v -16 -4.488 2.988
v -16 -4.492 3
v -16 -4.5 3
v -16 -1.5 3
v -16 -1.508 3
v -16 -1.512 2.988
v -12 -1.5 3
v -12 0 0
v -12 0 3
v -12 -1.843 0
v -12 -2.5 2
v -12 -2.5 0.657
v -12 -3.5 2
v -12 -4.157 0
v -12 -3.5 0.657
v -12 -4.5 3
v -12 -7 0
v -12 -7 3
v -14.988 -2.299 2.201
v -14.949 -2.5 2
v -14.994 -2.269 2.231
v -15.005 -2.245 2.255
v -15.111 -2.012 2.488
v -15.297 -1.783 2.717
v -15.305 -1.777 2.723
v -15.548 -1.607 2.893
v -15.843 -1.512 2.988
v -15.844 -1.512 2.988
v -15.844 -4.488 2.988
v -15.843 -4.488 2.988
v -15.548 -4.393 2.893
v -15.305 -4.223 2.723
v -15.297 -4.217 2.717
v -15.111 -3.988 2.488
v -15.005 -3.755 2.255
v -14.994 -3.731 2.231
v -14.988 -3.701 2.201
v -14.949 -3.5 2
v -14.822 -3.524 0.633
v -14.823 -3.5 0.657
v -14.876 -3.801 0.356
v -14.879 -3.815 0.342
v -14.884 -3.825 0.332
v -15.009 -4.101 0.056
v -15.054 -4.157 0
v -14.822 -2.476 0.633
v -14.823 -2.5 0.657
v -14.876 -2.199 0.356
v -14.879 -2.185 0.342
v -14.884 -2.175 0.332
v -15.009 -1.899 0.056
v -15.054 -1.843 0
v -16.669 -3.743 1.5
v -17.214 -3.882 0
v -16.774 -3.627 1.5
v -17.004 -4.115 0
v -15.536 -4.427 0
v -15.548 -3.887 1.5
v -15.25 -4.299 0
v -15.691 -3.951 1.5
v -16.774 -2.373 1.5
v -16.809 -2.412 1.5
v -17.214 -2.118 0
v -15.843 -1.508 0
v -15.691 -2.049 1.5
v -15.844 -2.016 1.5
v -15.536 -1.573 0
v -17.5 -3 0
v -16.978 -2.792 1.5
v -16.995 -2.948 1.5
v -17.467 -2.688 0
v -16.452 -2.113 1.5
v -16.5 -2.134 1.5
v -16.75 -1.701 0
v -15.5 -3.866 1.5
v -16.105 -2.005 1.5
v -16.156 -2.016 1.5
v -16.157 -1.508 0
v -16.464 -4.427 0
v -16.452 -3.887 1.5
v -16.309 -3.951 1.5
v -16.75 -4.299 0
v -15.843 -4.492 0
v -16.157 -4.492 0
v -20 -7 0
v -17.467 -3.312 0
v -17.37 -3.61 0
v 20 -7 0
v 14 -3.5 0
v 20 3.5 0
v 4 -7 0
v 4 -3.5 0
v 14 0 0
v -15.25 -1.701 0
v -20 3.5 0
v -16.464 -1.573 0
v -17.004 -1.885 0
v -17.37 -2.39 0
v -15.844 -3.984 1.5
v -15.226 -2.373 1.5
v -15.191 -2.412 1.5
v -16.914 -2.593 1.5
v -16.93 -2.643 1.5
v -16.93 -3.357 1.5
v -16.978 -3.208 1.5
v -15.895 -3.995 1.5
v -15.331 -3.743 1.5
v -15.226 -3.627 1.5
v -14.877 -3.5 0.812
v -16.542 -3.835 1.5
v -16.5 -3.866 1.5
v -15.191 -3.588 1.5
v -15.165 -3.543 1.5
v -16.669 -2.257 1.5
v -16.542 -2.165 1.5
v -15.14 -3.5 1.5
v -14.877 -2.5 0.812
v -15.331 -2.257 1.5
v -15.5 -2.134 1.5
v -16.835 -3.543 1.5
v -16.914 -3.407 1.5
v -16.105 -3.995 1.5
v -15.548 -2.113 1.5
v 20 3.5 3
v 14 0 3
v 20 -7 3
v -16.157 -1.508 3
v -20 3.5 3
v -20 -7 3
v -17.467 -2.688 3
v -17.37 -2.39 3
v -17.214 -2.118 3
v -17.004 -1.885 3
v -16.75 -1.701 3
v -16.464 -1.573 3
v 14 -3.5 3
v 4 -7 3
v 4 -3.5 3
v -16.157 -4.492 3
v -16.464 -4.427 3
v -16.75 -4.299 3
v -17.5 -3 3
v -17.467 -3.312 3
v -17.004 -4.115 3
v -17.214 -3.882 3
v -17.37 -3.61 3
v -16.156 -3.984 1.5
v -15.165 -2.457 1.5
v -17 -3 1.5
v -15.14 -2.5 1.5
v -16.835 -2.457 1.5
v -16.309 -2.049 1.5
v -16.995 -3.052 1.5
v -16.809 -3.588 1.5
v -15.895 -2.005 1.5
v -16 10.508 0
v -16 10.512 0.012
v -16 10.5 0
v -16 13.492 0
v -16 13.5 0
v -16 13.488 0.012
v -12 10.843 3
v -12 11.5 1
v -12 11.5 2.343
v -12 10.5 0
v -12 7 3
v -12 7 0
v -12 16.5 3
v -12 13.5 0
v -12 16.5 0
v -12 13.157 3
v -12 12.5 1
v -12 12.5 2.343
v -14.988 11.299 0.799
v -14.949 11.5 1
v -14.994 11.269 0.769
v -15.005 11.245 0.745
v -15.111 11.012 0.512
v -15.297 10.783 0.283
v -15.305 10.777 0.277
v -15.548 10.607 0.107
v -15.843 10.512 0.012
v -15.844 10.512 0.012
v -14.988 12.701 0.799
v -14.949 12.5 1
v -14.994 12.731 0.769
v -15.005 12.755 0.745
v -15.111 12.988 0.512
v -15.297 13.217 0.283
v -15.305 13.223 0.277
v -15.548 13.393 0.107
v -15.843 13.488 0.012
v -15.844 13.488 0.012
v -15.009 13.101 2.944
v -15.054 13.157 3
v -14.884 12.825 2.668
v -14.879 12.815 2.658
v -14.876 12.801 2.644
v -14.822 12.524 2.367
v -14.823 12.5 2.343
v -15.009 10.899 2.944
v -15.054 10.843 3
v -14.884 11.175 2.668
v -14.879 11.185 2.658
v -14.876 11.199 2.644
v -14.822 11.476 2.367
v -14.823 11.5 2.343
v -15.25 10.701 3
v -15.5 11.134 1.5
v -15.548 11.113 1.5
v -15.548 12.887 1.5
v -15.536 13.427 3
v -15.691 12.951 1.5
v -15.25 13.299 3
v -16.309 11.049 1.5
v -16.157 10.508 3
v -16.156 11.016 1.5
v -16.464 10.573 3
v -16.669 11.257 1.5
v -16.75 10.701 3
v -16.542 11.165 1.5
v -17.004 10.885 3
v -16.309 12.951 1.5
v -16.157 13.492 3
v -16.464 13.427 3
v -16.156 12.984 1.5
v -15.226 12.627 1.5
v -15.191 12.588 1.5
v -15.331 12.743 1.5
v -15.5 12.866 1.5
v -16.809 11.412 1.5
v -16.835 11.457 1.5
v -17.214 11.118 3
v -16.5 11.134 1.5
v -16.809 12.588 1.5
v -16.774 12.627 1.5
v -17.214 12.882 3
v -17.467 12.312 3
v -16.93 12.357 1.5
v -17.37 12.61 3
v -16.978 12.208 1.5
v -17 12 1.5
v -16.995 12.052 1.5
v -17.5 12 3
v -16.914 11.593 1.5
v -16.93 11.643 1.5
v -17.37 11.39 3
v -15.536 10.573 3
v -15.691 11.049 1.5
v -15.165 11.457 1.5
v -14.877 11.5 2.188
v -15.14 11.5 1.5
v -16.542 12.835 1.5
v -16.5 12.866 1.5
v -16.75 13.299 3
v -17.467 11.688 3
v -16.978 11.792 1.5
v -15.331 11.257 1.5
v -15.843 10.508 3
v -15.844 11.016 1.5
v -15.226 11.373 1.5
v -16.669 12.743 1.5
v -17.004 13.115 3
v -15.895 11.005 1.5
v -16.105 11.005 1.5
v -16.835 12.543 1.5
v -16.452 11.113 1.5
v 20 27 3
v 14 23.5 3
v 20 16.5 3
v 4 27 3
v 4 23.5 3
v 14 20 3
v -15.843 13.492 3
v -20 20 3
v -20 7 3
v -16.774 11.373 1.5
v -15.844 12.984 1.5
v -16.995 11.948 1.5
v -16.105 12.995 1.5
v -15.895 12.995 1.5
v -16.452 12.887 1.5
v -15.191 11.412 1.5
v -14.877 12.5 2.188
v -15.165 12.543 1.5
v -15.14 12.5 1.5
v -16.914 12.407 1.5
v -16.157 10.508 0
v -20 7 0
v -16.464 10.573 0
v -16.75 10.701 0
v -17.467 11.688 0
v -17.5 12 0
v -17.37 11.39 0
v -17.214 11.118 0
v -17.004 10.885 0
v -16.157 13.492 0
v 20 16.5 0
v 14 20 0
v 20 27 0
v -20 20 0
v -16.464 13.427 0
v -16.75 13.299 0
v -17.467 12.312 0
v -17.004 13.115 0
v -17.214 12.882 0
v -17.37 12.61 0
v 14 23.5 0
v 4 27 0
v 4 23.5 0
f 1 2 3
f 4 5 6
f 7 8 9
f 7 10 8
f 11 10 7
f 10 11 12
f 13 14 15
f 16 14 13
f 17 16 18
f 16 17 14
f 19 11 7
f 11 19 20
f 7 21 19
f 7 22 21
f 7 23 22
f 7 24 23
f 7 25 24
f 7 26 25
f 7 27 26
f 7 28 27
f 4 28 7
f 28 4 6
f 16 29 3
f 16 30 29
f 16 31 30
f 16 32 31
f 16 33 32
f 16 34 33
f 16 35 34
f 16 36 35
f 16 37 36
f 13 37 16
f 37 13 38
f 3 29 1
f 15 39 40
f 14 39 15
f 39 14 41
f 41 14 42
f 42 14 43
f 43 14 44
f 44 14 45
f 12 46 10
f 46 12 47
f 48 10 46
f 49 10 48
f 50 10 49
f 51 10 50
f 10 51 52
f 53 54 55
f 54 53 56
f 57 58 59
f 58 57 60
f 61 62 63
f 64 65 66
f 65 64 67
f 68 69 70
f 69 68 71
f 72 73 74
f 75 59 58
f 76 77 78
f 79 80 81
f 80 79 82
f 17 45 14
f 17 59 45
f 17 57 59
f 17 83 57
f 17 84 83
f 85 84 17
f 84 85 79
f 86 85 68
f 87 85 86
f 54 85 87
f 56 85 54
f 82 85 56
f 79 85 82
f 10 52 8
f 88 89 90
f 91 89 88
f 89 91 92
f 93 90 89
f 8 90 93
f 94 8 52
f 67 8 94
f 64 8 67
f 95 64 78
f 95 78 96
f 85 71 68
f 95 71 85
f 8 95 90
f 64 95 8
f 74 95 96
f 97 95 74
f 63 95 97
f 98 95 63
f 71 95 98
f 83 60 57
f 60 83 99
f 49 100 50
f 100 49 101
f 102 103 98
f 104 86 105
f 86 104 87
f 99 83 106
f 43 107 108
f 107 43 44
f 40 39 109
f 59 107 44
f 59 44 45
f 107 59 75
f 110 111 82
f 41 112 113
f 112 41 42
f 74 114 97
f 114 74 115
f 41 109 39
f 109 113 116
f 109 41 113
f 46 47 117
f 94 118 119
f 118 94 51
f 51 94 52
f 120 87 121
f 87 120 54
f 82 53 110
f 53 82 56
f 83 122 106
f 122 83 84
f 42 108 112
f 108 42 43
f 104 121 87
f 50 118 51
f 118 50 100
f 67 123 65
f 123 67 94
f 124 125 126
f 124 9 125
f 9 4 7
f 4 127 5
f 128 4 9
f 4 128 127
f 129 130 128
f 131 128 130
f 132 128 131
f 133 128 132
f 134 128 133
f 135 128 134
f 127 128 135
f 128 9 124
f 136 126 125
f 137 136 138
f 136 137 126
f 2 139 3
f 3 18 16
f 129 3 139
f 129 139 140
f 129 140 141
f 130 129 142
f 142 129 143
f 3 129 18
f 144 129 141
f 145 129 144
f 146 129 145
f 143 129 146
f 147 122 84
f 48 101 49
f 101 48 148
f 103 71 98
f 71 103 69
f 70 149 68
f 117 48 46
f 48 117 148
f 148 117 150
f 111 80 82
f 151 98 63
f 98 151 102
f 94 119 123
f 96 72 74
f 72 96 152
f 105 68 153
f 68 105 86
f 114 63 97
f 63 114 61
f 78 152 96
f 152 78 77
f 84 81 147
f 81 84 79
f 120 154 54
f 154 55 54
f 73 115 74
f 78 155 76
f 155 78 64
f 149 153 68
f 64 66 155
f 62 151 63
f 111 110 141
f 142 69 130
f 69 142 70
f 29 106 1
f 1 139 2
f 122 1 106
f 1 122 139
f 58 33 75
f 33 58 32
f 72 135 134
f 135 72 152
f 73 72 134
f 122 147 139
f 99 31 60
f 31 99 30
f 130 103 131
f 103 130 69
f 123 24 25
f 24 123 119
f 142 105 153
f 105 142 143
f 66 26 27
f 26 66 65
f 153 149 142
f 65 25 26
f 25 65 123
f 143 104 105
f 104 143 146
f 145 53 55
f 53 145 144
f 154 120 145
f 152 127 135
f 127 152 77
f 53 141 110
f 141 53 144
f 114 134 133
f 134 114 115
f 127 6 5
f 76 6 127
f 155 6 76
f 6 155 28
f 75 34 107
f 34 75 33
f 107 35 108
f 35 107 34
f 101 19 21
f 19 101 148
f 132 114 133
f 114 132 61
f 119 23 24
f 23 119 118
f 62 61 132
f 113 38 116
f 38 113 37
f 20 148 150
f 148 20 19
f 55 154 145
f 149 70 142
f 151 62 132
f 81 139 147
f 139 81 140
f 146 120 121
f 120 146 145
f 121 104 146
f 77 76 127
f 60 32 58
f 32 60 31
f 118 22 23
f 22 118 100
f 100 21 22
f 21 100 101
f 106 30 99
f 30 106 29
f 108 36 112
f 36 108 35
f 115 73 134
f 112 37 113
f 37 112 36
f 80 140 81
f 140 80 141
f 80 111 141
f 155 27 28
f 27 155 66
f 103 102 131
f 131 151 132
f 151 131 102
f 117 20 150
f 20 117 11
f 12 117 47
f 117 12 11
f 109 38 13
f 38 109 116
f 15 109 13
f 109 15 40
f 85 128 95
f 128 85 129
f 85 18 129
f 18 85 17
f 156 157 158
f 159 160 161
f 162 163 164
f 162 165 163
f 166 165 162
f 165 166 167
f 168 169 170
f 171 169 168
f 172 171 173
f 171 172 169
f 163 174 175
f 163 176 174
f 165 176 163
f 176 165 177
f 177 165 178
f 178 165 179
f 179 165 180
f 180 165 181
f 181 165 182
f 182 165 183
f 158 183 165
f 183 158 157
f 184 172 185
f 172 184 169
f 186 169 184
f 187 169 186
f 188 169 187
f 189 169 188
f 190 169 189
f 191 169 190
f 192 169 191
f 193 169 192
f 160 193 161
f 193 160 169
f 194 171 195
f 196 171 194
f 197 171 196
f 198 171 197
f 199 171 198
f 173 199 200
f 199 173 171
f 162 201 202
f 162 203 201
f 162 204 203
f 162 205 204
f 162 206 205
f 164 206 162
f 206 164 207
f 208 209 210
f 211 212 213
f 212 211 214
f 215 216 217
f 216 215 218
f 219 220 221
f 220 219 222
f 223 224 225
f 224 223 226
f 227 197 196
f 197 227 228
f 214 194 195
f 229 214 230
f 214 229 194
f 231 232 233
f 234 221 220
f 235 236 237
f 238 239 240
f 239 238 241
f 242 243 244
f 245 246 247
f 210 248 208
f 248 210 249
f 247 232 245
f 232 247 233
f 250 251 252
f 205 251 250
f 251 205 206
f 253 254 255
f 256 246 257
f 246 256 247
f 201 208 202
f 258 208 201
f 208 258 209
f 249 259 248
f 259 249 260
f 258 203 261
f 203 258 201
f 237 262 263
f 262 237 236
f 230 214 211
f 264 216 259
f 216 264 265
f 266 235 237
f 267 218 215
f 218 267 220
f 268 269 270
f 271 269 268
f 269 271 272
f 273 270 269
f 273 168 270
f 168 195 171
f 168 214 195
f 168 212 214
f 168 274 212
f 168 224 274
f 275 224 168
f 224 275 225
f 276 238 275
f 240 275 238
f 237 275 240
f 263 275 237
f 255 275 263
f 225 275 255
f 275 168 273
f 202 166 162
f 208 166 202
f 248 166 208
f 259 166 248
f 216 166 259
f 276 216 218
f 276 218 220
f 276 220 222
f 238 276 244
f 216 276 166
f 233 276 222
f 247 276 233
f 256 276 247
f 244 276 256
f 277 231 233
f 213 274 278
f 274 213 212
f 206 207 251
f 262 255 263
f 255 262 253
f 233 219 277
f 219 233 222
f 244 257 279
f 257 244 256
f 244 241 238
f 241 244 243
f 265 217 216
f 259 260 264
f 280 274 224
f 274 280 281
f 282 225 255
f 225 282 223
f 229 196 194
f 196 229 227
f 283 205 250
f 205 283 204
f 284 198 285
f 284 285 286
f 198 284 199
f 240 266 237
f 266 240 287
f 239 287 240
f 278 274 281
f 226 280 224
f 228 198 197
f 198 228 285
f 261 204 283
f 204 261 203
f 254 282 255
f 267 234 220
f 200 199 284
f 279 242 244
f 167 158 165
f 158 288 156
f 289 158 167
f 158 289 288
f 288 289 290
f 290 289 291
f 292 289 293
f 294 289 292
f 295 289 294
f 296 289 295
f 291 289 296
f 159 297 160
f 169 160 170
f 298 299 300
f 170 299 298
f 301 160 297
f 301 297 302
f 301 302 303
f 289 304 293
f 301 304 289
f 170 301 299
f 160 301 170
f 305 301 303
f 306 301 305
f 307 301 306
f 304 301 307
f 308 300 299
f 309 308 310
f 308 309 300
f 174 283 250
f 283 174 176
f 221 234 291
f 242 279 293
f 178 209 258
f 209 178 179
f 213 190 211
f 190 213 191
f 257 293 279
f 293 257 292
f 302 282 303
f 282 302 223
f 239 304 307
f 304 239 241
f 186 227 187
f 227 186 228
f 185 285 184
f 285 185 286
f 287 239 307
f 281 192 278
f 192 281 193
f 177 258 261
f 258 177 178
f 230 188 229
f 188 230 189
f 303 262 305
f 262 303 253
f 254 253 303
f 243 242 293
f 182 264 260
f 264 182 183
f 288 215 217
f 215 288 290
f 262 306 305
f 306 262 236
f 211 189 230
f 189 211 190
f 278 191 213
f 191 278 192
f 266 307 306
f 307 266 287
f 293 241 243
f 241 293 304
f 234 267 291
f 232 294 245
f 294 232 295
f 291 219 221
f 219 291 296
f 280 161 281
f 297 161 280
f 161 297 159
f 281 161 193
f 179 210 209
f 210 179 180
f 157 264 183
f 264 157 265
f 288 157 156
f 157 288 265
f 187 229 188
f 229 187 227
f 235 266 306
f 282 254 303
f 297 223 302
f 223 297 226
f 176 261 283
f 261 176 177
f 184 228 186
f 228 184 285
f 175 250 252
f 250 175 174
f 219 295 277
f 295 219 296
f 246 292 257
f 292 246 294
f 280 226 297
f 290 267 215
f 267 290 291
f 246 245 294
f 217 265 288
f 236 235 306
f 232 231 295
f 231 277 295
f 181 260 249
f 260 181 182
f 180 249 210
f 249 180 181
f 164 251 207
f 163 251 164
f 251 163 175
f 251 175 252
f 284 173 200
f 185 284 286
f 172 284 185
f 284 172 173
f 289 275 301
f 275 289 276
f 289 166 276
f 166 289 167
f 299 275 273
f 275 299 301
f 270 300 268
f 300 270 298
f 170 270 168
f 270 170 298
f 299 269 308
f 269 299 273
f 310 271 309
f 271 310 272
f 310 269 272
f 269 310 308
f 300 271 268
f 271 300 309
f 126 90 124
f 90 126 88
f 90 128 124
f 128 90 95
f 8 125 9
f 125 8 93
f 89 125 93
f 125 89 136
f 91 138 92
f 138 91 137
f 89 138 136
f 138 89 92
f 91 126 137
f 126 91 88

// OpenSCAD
// Lower connector piece
// Main beam
translate([-20,0,0])
	cube(size=[40,3.5,3]);

// Spacer for lip that connect to ring
translate([14,-6.5,0])
	cube(size=[6,10,3]);

// Lower lip that connects to ring
translate([4,-7,0])
	cube(size=[16,3.5,3]);

// Connector piece for ball chain
translate([-20,0,0])
	difference() {
		// 8mm x 10mm block
		translate([0,-7,0])
			cube(size=[8,10,3]);
		union() {
			// Cut two conic holes to retain ball cord
			translate([4,-3,1.5])
				cylinder(h=3,r1=1.5,r2=0.5,center=true,$fs=0.01);
			translate([4,-3,1.5])
				cylinder(h=3,r1=0.5,r2=1.5,center=true,$fs=0.01);

			// Basic slot for cord
			translate([4,-3.5,0])
				cube(size=[4,1,3]);

			// Diagonal cut to allow cord to pass through
			union() {
				translate([4,-3,1.5])
					rotate(a=[45,0,0])
						cube(4,2.12,2.12);
				translate([4,-3,-4.5])
					rotate(a=[45,0,0])
						cube(4,2.12,2.12);
			}
		}
	}


// Upper connector piece
translate([0,20,3]) rotate(a=[0,180,180]) {
	// Main beam
	translate([-20,0,0])
		cube(size=[40,3.5,3]);
	
	// Spacer for lip that connect to ring
	translate([14,-6.5,0])
		cube(size=[6,10,3]);
	
	// Lower lip that connects to ring
	translate([4,-7,0])
		cube(size=[16,3.5,3]);
	
	// Connector piece for ball chain
	translate([-20,0,0])
		difference() {
			// 8mm x 16mm block
			cube(size=[8,13,3]);
			union() {
				// Cut two conic holes to retain ball cord
				translate([4,8,1.5])
					cylinder(h=3,r1=1.5,r2=0.5,center=true,$fs=0.01);
				translate([4,8,1.5])
					cylinder(h=3,r1=0.5,r2=1.5,center=true,$fs=0.01);
	
				// Basic slot for cord
				translate([4,7.5,0])
					cube(size=[4,1,3]);
	
				// Diagonal cut to allow cord to pass through
				union() {
					translate([4,8,1.5])
						rotate(a=[45,0,0])
							cube(4,2.12,2.12);
					translate([4,8,-4.5])
						rotate(a=[45,0,0])
							cube(4,2.12,2.12);
				}
			}
		}
}
